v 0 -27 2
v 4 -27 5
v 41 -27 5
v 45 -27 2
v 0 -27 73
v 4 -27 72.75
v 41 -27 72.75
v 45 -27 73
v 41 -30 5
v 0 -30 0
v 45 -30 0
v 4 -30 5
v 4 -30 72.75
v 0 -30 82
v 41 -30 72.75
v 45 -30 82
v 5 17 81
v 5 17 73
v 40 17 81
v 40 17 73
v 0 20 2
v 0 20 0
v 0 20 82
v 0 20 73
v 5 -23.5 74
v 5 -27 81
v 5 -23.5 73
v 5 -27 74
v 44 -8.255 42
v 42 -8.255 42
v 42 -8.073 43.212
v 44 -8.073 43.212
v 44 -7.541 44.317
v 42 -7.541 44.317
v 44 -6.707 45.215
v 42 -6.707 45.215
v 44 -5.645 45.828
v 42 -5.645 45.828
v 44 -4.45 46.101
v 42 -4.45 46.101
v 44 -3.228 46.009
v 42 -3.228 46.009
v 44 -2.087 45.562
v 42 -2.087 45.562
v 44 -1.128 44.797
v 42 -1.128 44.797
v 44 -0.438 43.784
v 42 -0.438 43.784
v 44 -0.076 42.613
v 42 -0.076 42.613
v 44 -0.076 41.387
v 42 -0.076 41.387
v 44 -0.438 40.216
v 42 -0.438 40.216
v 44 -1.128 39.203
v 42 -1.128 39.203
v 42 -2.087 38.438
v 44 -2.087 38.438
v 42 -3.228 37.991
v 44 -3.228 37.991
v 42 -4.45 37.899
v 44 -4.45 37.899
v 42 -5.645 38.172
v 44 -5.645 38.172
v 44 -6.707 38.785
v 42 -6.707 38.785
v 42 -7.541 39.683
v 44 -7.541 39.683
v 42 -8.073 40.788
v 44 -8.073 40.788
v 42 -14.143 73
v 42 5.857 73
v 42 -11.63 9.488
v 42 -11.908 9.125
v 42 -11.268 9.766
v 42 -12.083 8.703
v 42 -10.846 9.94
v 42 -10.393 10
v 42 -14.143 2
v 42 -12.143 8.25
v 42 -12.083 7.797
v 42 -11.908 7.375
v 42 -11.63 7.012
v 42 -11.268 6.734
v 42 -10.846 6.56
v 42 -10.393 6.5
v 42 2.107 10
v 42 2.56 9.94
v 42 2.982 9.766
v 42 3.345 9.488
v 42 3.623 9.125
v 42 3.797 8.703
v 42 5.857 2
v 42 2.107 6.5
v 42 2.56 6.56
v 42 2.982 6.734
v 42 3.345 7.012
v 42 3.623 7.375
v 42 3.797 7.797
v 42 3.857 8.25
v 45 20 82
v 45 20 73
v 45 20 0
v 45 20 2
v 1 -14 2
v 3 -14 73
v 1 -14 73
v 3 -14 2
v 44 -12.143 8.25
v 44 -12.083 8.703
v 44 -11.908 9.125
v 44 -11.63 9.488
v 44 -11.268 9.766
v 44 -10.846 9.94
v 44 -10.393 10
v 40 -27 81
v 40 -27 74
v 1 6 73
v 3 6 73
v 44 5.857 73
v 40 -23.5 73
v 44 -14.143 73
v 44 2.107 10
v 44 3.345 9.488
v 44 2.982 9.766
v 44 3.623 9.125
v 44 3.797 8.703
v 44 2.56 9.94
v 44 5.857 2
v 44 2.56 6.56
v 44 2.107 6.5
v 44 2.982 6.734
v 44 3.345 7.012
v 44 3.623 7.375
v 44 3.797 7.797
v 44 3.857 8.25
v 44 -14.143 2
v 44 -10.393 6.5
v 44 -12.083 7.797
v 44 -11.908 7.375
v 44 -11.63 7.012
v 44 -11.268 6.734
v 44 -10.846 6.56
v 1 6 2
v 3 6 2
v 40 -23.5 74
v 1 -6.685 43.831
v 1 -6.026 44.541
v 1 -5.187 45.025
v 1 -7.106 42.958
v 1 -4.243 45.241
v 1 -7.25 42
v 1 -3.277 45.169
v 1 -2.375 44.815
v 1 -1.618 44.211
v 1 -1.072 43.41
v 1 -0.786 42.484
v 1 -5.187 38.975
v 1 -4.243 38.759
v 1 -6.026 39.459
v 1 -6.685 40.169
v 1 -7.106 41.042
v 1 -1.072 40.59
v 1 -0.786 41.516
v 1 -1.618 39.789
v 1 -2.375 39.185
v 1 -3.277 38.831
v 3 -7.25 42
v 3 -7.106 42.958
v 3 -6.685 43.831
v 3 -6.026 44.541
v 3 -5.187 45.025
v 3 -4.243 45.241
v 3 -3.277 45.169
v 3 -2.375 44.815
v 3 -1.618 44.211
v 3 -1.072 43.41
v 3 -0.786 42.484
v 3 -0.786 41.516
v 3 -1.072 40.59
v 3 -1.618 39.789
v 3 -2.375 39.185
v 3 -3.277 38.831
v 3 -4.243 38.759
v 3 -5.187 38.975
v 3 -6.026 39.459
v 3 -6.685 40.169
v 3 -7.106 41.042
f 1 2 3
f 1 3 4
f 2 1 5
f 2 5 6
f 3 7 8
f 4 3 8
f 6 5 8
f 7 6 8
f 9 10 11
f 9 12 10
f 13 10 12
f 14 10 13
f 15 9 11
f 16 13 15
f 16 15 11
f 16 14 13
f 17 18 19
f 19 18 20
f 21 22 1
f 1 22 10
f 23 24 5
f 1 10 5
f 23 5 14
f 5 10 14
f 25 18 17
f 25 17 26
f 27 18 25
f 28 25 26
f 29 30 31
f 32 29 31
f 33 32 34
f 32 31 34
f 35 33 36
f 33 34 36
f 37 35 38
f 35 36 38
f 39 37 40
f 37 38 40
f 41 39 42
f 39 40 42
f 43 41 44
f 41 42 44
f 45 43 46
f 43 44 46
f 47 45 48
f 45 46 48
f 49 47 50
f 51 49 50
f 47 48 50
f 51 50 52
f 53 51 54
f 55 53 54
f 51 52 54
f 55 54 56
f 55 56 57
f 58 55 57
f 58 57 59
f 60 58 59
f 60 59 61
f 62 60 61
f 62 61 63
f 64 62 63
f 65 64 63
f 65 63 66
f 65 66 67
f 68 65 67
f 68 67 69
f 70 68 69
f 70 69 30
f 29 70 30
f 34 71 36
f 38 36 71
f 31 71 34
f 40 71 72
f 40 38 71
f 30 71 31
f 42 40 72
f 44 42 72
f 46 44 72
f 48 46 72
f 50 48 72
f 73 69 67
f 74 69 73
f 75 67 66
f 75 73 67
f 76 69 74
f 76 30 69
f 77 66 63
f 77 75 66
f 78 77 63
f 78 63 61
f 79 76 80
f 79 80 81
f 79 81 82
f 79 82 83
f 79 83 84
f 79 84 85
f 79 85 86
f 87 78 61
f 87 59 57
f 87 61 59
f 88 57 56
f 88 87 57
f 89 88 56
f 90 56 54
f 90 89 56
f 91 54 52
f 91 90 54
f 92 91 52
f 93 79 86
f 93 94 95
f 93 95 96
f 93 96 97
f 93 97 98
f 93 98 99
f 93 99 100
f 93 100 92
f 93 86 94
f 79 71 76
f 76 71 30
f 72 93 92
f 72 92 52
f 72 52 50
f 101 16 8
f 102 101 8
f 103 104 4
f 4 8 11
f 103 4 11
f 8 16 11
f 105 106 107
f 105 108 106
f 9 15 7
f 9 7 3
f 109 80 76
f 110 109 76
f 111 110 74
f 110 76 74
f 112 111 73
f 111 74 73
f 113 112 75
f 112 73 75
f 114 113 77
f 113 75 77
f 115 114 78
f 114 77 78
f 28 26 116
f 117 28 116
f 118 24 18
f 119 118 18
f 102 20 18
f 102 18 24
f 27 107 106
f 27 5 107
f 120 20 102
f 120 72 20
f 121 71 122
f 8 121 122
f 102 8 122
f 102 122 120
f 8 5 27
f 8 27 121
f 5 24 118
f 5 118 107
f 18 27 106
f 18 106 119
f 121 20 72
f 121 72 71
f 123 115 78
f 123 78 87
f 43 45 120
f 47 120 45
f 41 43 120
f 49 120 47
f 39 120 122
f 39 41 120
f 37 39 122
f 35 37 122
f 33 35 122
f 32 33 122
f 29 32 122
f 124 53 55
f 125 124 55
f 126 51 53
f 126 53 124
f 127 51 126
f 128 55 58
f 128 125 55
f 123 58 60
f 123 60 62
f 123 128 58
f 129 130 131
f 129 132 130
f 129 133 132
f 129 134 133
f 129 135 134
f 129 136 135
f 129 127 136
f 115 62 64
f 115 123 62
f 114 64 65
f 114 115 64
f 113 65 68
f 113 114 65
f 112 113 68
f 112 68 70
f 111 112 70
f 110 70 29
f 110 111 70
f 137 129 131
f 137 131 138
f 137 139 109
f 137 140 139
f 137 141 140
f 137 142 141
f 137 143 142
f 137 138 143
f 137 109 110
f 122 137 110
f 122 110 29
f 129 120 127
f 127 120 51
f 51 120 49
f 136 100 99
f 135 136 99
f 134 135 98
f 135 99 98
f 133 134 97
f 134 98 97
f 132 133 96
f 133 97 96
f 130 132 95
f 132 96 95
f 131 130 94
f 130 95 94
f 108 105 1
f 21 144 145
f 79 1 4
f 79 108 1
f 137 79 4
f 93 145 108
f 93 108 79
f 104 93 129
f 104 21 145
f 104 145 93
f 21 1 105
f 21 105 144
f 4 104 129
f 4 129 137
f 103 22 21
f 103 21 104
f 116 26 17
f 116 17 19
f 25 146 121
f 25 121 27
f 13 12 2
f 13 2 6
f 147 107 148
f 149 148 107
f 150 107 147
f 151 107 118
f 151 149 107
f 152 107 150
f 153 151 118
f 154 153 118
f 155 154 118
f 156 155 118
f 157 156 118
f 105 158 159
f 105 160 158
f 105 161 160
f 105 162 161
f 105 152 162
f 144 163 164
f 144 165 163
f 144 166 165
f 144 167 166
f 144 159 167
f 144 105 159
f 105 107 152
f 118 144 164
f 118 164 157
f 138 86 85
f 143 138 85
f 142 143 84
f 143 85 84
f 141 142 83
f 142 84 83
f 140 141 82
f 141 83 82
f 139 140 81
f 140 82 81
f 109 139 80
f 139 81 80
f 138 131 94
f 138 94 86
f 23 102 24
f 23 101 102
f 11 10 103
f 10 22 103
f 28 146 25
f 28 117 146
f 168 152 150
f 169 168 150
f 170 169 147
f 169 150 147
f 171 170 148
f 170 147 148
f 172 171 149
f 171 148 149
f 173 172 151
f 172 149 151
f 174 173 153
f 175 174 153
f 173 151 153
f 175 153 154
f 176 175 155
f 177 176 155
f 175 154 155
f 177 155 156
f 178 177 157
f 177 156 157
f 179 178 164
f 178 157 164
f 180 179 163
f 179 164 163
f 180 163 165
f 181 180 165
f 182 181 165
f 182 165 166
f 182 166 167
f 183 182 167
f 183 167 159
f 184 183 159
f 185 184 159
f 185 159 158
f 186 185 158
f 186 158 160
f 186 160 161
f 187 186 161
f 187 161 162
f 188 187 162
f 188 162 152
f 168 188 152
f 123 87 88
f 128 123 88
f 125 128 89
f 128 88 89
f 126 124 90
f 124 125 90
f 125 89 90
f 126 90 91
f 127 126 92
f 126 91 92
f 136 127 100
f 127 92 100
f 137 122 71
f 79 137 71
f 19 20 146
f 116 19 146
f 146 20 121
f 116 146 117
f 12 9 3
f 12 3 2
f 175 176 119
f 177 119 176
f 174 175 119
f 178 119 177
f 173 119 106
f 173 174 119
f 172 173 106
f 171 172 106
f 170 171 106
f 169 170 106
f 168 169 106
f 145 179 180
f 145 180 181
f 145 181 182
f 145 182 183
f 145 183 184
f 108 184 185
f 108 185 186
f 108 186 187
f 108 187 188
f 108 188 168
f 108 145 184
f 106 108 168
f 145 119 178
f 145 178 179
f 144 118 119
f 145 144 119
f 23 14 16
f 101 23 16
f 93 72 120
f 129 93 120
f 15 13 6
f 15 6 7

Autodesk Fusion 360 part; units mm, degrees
sketch "Sketch1" plane through (0, 0, 0) normal (0, 0, 1) x (1, 0, 0)
  line L0 (0, 20) -> (45, 20)
  line L1 (45, 20) -> (45, -30)
  line L2 (45, -30) -> (0, -30)
  line L3 (0, -30) -> (0, 20)
  dimension "d1" = 50
  dimension "d2" = 45
extrude "Extrude1" add sketch "Sketch1" along normal blind 2
sketch "Sketch2" plane through (0, 0, 2) normal (0, 0, 1) x (-1, 0, 0)
  line L0 (0, 30) -> (-45, 30)
  line L1 (-45, 30) -> (-45, -20)
  line L2 (-45, -20) -> (0, -20)
  line L3 (0, -20) -> (0, 30)
  line L4 (-1, -6) -> (-3, -6)
  line L5 (-3, -6) -> (-3, 14)
  line L6 (-3, 14) -> (-1, 14)
  line L7 (-1, 14) -> (-1, -6)
  line L8 (-42, -5.8571) -> (-44, -5.8571)
  line L9 (-44, -5.8571) -> (-44, 14.1429)
  line L10 (-44, 14.1429) -> (-42, 14.1429)
  line L11 (-42, 14.1429) -> (-42, -5.8571)
  line L12 (-45, -20) -> (-45, 30)
  line L13 (0, 27) -> (-45, 27)
  line L14 (-45, 27) -> (-45, 30)
  line L15 (-45, 30) -> (0, 30)
  line L16 (0, 30) -> (0, 27)
  dimension "d5" = 20
  dimension "d6" = 2
  dimension "d10" = 2
  dimension "d11" = 39
  dimension "d44" = 1
extrude "Extrude2" add sketch "Sketch2" along normal blind 50 contours L4 L5 L6 L7 | L8 L9 L10 L11
sketch "Sketch3" plane through (42, 0, 0) normal (-1, 0, 0) x (0, -1, 0)
  line L0 (-5.8571, 2) -> (14.1429, 2)
  line L1 (14.1429, 2) -> (14.1429, 52)
  line L2 (14.1429, 52) -> (-5.8571, 52)
  line L3 (-5.8571, 52) -> (-5.8571, 2)
  circle A0 centre (4.1429, 42) radius 4.1125
  dimension "d15" = 8.225
  dimension "d16" = 40
  dimension "d34" = 10
extrude "Extrude3" cut sketch "Sketch3" against normal blind 2 contours A0
sketch "Sketch4" plane through (1, 0, 0) normal (-1, 0, 0) x (0, -1, 0)
  line L0 (-6, 2) -> (14, 2)
  line L1 (14, 2) -> (14, 52)
  line L2 (14, 52) -> (-6, 52)
  line L3 (-6, 52) -> (-6, 2)
  circle A0 centre (4, 42) radius 3.25
  dimension "d19" = 6.5
  dimension "d33" = 10
  dimension "d41" = 10
extrude "Extrude4" cut sketch "Sketch4" against normal blind 2 contours A0
extrude "Extrude5" add sketch "Sketch2" along normal blind 80 contours L0 L1 L3 L12 L13 L14 L15 L16
sketch "Sketch6" plane through (0, -30, 0) normal (0, -1, 0) x (1, 0, 0)
  line L0 (0, 0) -> (45, 0)
  line L1 (45, 0) -> (45, 82)
  line L2 (0, 82) -> (0, 0)
  line L3 (4, 79) -> (41, 79)
  line L4 (41, 79) -> (41, 5)
  line L5 (41, 5) -> (4, 5)
  line L6 (4, 5) -> (4, 79)
  line L7 (45, 82) -> (0, 82)
  dimension "d49" = 74
  dimension "d50" = 5
  dimension "d63" = 37
  dimension "d64" = 4
extrude "Extrude6" cut sketch "Sketch6" against normal blind 3 contours L3 L4 L5 L6
extrude "Extrude9" add 1 faces at (16.3333, -29, 79) along direction (0, 0, -1) blind 1.25
extrude "Extrude10" add 2 faces at (43.3333, -0.8095, 52) (1.6667, -0.6667, 52) along direction (0, 0, 1) blind 26
sketch "Sketch9" plane through (0, -27, 0) normal (0, 1, 0) x (-1, 0, 0)
  line L0 (-45, 2) -> (0, 2)
  line L1 (0, 2) -> (0, 82)
  line L2 (0, 82) -> (-45, 82)
  line L3 (-45, 82) -> (-45, 2)
  line L4 (-45, 82) -> (0, 82)
  line L5 (0, 82) -> (0, 73)
  line L6 (0, 73) -> (-45, 73)
  line L7 (-45, 73) -> (-45, 82)
  line L8 (-41, 5) -> (-41, 77.75)
  line L9 (-41, 77.75) -> (-4, 77.75)
  line L10 (-4, 77.75) -> (-4, 5)
  line L11 (-4, 5) -> (-41, 5)
  dimension "d51" = 9
extrude "Extrude11" add sketch "Sketch9" along normal blind 37 contours L1 L2 L3 L4 L5 L6 L7 L8 L9 L10 | L6 L8 L9 L10
extrude "Extrude12" add 1 faces at (30, 10, 79) along direction (0, 1, 0) blind 5
sketch "Sketch10" plane through (0, 0, 73) normal (0, 0, -1) x (1, 0, 0)
  line L0 (1, -6) -> (1, 14)
  line L1 (1, 14) -> (3, 14)
  line L2 (3, 14) -> (3, -6)
  line L3 (3, -6) -> (1, -6)
  line L4 (42, -5.8571) -> (42, 14.1429)
  line L5 (42, 14.1429) -> (44, 14.1429)
  line L6 (44, 14.1429) -> (44, -5.8571)
  line L7 (44, -5.8571) -> (42, -5.8571)
  line L8 (4, 27) -> (0, 27)
  line L9 (0, 27) -> (0, -15)
  line L10 (0, -15) -> (45, -15)
  line L11 (45, -15) -> (45, 27)
  line L12 (40, -12.6) -> (5, -12.6)
  line L13 (5, -12.6) -> (5, 25)
  line L14 (5, 25) -> (40, 25)
  line L15 (40, 25) -> (40, -12.6)
  line L16 (45, 27) -> (41, 27)
  line L17 (41, 27) -> (4, 27)
  line L18 (40, 25) -> (5, 25)
  line L19 (5, 25) -> (5, 27)
  line L20 (5, 27) -> (40, 27)
  line L21 (40, 27) -> (40, 25)
  dimension "d74" = 2
  dimension "d75" = 37.6
extrude "Extrude13" cut sketch "Sketch10" against normal blind 8 contours L12 L13 L14 L15 L18
extrude "Extrude14" add 1 faces at (16.3333, -29, 77.75) along direction (0, 0, -1) blind 5
extrude "Extrude15" cut sketch "Sketch10" against normal blind 8 contours L14 L17 L18 L19 L20 L21
sketch "Sketch11" plane through (0, -27, 0) normal (0, 1, 0) x (-1, 0, 0)
  line L0 (-4, 72.75) -> (-4, 5)
  line L1 (-4, 5) -> (-41, 5)
  line L2 (-41, 5) -> (-41, 72.75)
  line L3 (-41, 72.75) -> (-4, 72.75)
  line L4 (0, 73) -> (-5, 73)
  line L5 (-5, 73) -> (-5, 81)
  line L6 (-5, 81) -> (-40, 81)
  line L7 (-40, 81) -> (-40, 73)
  line L8 (-40, 73) -> (-45, 73)
  line L9 (-45, 73) -> (-45, 2)
  line L10 (-45, 2) -> (0, 2)
  line L11 (0, 2) -> (0, 73)
  line L12 (-40, 74) -> (-5, 74)
  line L13 (-5, 74) -> (-5, 73)
  line L14 (-5, 73) -> (-40, 73)
  line L15 (-40, 73) -> (-40, 74)
extrude "Extrude16" add sketch "Sketch11" along normal blind 3.5 contours L5 L7 L12 L13 L14 L15
sketch "Sketch12" plane through (44, 0, 0) normal (1, 0, 0) x (0, 1, 0)
  line L0 (5.8571, 73) -> (-14.1429, 73)
  line L1 (-14.1429, 73) -> (-14.1429, 2)
  line L2 (-14.1429, 2) -> (5.8571, 2)
  line L3 (5.8571, 2) -> (5.8571, 73)
  circle A0 centre (-4.1429, 42) radius 4.1125
  line L4 (-12.1429, 10) -> (3.8571, 10)
  line L5 (3.8571, 10) -> (3.8571, 6.5)
  line L6 (3.8571, 6.5) -> (-12.1429, 6.5)
  line L7 (-12.1429, 6.5) -> (-12.1429, 10)
  dimension "d65" = 3.5
  dimension "d66" = 2
  dimension "d67" = 16
extrude "Extrude17" cut sketch "Sketch12" against normal blind 2 contours L4 L5 L6 L7
fillet "Fillet1" radius 1.75 4 edges at (43, 3.8571, 6.5) (43, 3.8571, 10) (43, -12.1429, 10) (43, -12.1429, 6.5)
extrude "Extrude18" add 1 faces at (30, 15, 79) along direction (0, 1, 0) blind 5
sketch "Sketch13" plane through (0, 0, 73) normal (0, 0, -1) x (1, 0, 0)
  line L0 (40, 23.5) -> (40, -12.6)
  line L1 (40, -12.6) -> (5, -12.6)
  line L2 (5, -12.6) -> (5, 23.5)
  line L3 (5, 23.5) -> (40, 23.5)
  line L4 (45, 27) -> (0, 27)
  line L5 (0, 27) -> (0, -20)
  line L6 (0, -20) -> (45, -20)
  line L7 (45, -20) -> (45, 27)
  line L8 (1, -6) -> (1, 14)
  line L9 (1, 14) -> (3, 14)
  line L10 (3, 14) -> (3, -6)
  line L11 (3, -6) -> (1, -6)
  line L12 (42, -5.8571) -> (42, 14.1429)
  line L13 (42, 14.1429) -> (44, 14.1429)
  line L14 (44, 14.1429) -> (44, -5.8571)
  line L15 (44, -5.8571) -> (42, -5.8571)
  line L16 (40, -12.6) -> (5, -12.6)
  line L17 (5, -12.6) -> (5, -17)
  line L18 (5, -17) -> (40, -17)
  line L19 (40, -17) -> (40, -12.6)
extrude "Extrude19" cut sketch "Sketch13" against normal blind 8 contours L1 L16 L17 L18 L19
